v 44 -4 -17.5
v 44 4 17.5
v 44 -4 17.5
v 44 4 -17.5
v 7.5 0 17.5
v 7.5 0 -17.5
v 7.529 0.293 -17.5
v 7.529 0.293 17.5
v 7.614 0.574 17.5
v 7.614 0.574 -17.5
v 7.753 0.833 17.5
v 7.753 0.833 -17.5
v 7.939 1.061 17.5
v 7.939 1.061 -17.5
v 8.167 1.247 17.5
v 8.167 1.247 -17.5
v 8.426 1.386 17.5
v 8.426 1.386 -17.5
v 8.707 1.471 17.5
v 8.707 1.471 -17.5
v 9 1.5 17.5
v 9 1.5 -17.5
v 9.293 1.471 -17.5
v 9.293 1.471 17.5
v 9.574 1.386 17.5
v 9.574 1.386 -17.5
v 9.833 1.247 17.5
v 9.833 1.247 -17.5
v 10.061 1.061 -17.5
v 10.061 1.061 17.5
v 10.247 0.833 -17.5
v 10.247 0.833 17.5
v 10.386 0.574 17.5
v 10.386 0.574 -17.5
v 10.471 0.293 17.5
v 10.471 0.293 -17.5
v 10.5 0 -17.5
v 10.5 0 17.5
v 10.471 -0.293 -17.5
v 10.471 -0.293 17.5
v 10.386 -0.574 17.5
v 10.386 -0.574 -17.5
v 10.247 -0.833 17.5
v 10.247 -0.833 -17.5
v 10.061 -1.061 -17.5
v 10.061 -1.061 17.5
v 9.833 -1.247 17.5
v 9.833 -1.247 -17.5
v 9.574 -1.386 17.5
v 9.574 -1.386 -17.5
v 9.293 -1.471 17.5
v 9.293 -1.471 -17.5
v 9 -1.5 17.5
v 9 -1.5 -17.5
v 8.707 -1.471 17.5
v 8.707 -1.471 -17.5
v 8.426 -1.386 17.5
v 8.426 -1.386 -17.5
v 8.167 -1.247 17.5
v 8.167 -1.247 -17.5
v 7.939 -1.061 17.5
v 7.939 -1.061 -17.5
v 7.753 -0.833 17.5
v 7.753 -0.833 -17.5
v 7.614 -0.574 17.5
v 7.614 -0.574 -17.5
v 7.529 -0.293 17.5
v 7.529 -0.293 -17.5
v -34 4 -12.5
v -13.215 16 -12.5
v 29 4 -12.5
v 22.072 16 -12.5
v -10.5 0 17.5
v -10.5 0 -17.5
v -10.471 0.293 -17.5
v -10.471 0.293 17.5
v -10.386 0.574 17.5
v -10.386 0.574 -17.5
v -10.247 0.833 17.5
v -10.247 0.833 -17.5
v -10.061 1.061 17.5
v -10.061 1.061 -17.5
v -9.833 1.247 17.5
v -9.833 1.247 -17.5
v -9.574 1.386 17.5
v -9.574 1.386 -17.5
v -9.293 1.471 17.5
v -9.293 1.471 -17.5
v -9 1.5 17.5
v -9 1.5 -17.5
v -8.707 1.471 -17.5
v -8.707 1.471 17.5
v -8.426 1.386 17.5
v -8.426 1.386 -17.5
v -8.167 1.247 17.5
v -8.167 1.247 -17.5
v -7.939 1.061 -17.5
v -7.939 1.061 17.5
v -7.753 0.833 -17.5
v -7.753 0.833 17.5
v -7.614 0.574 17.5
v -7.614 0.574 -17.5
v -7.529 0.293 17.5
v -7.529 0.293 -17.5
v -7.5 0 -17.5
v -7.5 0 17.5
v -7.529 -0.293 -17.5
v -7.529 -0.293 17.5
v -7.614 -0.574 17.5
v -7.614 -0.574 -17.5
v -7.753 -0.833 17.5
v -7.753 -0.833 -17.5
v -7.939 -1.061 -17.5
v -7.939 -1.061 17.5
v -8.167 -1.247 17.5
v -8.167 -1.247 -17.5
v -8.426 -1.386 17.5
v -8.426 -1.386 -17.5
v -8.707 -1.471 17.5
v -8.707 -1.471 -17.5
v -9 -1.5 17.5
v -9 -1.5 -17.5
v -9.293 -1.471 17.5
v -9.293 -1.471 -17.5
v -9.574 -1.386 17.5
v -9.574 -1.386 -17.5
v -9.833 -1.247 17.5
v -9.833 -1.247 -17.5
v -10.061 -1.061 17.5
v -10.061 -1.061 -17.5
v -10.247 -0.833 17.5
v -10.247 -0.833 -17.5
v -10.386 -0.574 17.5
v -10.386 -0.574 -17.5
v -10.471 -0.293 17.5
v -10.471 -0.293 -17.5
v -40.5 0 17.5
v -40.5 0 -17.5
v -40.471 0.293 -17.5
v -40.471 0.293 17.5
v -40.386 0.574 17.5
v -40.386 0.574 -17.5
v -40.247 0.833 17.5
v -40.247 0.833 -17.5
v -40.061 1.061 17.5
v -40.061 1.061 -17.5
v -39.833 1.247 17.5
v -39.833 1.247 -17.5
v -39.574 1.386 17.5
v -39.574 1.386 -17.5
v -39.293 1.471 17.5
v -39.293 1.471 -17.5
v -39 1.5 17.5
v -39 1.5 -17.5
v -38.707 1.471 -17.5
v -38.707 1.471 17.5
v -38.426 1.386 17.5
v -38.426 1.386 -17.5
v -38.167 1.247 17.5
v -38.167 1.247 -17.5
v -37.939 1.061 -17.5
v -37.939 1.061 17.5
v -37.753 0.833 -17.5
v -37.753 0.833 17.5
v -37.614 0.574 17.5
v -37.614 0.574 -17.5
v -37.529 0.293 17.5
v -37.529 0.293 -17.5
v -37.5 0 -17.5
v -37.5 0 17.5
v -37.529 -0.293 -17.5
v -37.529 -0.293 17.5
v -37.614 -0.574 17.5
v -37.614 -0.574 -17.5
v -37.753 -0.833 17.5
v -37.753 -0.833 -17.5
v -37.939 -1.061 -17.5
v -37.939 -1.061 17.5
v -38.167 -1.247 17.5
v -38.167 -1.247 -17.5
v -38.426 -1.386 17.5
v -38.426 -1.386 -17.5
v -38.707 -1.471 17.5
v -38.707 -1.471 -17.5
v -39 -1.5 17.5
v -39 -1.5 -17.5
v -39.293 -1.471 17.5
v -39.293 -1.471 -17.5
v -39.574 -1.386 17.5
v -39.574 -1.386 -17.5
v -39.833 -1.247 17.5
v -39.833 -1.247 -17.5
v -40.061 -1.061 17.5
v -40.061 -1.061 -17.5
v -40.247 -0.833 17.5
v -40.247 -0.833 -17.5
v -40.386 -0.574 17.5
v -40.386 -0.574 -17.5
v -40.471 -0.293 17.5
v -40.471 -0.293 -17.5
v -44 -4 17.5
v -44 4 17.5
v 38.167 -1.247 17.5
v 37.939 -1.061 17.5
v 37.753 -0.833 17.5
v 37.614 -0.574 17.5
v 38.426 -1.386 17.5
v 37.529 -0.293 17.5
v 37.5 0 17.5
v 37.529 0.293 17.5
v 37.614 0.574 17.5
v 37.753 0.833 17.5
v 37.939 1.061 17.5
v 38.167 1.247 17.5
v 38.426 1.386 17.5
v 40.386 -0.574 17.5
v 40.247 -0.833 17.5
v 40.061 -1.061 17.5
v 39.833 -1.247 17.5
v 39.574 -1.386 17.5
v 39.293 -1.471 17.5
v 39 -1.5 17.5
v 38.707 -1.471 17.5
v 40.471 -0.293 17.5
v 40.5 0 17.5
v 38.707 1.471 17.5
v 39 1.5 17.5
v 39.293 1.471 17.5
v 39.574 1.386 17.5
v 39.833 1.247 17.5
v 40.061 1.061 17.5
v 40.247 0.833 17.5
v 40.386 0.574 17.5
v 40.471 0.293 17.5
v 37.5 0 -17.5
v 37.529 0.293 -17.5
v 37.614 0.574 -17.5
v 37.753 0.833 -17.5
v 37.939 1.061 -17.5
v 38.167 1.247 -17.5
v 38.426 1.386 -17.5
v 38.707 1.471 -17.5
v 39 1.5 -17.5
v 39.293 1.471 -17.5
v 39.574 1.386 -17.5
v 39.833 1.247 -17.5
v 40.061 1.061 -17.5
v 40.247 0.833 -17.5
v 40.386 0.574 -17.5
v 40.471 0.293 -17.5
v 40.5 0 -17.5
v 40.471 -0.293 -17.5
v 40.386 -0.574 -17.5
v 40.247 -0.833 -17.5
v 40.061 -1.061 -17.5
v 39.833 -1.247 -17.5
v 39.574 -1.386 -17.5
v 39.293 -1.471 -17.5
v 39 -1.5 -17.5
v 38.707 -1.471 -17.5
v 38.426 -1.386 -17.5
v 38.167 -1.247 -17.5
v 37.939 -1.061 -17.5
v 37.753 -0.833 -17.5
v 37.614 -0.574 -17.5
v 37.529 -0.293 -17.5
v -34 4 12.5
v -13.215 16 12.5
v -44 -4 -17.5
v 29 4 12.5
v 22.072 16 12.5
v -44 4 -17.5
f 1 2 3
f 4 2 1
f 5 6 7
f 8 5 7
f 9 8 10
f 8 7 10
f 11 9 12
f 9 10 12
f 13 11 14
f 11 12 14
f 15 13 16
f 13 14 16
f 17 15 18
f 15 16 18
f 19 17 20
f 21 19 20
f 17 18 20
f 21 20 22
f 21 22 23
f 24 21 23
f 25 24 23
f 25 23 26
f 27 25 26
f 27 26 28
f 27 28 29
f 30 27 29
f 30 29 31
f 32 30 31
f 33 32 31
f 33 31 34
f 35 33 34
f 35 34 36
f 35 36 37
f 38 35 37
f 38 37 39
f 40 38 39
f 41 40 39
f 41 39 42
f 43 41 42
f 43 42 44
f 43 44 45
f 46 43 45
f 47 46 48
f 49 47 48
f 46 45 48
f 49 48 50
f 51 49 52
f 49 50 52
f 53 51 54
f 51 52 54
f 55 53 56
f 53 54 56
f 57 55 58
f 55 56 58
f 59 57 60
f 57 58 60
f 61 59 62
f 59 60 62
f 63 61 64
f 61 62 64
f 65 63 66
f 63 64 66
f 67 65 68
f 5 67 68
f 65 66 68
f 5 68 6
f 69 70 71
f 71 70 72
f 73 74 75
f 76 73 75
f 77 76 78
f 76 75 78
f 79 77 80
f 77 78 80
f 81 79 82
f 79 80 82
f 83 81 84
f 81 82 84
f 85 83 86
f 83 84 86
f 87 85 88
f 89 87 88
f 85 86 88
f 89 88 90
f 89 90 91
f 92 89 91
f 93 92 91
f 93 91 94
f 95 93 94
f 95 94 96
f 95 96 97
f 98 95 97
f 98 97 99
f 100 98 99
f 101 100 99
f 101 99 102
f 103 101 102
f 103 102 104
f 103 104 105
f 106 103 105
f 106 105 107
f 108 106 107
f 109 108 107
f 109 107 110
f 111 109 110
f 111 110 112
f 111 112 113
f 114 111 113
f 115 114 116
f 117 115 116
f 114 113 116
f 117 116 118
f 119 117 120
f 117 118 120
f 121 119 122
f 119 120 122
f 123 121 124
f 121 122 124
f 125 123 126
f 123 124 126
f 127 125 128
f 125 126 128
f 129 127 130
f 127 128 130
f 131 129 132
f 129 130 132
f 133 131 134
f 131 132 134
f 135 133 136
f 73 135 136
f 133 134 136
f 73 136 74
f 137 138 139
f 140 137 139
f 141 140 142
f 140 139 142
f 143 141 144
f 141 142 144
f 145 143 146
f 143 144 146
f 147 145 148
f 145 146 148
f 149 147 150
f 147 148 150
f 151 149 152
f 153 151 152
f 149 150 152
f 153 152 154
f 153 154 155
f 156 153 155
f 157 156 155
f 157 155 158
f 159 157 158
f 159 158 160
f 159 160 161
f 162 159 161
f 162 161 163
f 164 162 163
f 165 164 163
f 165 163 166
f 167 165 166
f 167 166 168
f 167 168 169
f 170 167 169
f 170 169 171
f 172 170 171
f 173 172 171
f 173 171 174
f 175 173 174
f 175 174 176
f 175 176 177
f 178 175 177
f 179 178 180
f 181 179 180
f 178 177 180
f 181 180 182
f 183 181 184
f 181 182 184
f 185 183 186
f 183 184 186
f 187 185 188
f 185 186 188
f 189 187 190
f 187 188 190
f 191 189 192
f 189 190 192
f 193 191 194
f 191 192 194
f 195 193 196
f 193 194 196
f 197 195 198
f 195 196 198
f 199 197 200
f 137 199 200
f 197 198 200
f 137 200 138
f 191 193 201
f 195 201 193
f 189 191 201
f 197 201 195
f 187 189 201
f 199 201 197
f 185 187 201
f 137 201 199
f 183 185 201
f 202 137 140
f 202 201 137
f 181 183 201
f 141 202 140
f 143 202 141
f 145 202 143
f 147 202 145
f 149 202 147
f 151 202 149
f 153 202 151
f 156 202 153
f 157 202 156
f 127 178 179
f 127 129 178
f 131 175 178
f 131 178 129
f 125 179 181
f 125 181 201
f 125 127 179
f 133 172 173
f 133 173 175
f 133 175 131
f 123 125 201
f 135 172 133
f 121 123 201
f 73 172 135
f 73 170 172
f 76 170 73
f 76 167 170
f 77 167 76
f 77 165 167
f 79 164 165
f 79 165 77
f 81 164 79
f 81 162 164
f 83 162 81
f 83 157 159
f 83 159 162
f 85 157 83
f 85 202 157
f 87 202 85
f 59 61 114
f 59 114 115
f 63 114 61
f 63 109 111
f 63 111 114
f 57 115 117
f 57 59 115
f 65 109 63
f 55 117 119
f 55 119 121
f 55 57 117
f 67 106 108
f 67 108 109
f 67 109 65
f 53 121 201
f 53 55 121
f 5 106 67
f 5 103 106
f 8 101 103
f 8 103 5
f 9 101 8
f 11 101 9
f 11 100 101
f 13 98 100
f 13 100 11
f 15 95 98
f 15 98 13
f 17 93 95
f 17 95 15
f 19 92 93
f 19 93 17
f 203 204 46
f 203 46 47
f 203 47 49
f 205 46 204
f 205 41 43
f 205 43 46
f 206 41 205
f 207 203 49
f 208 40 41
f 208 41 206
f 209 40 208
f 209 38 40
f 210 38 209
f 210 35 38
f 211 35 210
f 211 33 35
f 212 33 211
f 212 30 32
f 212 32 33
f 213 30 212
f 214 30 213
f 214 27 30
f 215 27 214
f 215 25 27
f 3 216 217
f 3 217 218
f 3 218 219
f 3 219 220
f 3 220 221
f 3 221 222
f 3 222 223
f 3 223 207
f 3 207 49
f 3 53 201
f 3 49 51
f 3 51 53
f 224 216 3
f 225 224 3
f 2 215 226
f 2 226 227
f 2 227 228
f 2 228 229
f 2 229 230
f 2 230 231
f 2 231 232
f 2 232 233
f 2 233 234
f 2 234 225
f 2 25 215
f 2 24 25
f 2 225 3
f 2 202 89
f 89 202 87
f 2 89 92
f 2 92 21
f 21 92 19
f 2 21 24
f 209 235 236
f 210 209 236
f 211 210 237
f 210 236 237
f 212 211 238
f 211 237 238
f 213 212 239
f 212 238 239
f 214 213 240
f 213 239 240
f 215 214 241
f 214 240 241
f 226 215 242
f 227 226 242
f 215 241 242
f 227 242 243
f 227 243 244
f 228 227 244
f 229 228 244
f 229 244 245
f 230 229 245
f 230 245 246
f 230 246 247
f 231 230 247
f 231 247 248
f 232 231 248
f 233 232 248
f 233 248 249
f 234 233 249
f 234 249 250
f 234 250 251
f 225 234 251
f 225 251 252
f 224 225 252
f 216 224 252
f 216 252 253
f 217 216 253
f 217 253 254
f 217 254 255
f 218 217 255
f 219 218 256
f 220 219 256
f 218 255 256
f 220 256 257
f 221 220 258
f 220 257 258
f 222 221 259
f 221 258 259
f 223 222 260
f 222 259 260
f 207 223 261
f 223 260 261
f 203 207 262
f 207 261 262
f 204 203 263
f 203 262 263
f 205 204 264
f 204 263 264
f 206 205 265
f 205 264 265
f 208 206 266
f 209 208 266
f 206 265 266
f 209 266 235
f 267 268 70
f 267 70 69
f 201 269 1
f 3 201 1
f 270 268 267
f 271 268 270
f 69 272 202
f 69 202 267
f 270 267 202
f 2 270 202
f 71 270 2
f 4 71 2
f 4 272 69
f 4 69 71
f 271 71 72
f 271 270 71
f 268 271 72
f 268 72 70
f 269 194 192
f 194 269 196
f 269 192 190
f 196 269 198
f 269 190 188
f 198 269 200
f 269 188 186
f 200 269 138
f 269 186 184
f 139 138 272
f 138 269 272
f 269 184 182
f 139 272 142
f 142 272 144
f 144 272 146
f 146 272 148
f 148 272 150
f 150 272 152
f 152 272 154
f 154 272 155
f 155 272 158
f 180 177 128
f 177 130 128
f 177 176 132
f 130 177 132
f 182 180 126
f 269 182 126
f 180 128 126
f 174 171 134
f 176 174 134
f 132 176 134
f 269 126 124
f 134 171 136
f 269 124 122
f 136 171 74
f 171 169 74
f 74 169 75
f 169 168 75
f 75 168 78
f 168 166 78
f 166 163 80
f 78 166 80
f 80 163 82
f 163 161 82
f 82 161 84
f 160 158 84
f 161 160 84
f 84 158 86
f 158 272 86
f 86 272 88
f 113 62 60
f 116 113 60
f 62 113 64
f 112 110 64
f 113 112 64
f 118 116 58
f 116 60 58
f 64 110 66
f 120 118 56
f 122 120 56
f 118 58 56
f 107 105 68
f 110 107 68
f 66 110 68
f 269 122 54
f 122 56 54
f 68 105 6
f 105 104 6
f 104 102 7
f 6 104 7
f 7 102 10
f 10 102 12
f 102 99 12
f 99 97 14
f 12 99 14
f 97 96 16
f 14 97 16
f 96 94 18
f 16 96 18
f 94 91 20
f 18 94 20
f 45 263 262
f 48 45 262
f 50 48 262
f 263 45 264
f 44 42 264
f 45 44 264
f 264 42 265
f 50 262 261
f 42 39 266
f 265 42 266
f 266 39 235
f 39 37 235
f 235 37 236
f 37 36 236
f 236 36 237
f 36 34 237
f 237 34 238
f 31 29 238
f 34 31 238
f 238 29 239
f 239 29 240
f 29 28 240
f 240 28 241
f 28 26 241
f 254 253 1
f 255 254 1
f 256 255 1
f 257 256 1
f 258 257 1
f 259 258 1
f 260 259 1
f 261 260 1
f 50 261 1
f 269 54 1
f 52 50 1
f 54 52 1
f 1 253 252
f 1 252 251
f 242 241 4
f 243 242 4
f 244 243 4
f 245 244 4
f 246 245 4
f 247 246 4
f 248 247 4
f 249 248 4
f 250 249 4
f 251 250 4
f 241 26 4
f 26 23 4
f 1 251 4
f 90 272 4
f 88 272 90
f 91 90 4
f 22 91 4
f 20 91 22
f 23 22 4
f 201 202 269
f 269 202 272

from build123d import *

# Parameters (mm, degrees)
EXTRUDE_1_DEPTH      = 4
EXTRUDE_1_DEPTH_BACK = 4
SKETCH_1_W           = 88
SKETCH_1_H           = 35
SKETCH_2_R           = 1.5
CUT_EXTRUDE_1_DEPTH  = 57.364882684
EXTRUDE_2_DEPTH      = 12.5


with BuildPart() as part:
    # 草图1 → 凸台-拉伸1 (new, two sides: drawn at the far end of the back side and taken through both)
    with BuildSketch(Plane(origin=(0, 0, 0), x_dir=(1, 0, 0), z_dir=(0, 1, 0)).offset(-EXTRUDE_1_DEPTH_BACK)):
        Rectangle(SKETCH_1_W, SKETCH_1_H)
    extrude(amount=EXTRUDE_1_DEPTH + EXTRUDE_1_DEPTH_BACK)

    # 草图2 → 切除-拉伸1 (cut, through all)
    with BuildSketch(Plane(origin=(0, 0, -17.5), x_dir=(-1, 0, 0), z_dir=(0, 0, -1))):
        with Locations((39, 0)):
            Circle(SKETCH_2_R)
        with Locations((-39, 0)):
            Circle(SKETCH_2_R)
        with Locations((-9, 0)):
            Circle(SKETCH_2_R)
        with Locations((9, 0)):
            Circle(SKETCH_2_R)
    extrude(amount=-CUT_EXTRUDE_1_DEPTH, mode=Mode.SUBTRACT)

    # 草图3 → 凸台-拉伸2 (add, symmetric)
    with BuildSketch(Plane.XY):
        Polygon((29, 4), (22.07179677, 16), (-13.215390309, 16), (-34, 4), align=None)
    extrude(amount=EXTRUDE_2_DEPTH, both=True)


solid = part.part
